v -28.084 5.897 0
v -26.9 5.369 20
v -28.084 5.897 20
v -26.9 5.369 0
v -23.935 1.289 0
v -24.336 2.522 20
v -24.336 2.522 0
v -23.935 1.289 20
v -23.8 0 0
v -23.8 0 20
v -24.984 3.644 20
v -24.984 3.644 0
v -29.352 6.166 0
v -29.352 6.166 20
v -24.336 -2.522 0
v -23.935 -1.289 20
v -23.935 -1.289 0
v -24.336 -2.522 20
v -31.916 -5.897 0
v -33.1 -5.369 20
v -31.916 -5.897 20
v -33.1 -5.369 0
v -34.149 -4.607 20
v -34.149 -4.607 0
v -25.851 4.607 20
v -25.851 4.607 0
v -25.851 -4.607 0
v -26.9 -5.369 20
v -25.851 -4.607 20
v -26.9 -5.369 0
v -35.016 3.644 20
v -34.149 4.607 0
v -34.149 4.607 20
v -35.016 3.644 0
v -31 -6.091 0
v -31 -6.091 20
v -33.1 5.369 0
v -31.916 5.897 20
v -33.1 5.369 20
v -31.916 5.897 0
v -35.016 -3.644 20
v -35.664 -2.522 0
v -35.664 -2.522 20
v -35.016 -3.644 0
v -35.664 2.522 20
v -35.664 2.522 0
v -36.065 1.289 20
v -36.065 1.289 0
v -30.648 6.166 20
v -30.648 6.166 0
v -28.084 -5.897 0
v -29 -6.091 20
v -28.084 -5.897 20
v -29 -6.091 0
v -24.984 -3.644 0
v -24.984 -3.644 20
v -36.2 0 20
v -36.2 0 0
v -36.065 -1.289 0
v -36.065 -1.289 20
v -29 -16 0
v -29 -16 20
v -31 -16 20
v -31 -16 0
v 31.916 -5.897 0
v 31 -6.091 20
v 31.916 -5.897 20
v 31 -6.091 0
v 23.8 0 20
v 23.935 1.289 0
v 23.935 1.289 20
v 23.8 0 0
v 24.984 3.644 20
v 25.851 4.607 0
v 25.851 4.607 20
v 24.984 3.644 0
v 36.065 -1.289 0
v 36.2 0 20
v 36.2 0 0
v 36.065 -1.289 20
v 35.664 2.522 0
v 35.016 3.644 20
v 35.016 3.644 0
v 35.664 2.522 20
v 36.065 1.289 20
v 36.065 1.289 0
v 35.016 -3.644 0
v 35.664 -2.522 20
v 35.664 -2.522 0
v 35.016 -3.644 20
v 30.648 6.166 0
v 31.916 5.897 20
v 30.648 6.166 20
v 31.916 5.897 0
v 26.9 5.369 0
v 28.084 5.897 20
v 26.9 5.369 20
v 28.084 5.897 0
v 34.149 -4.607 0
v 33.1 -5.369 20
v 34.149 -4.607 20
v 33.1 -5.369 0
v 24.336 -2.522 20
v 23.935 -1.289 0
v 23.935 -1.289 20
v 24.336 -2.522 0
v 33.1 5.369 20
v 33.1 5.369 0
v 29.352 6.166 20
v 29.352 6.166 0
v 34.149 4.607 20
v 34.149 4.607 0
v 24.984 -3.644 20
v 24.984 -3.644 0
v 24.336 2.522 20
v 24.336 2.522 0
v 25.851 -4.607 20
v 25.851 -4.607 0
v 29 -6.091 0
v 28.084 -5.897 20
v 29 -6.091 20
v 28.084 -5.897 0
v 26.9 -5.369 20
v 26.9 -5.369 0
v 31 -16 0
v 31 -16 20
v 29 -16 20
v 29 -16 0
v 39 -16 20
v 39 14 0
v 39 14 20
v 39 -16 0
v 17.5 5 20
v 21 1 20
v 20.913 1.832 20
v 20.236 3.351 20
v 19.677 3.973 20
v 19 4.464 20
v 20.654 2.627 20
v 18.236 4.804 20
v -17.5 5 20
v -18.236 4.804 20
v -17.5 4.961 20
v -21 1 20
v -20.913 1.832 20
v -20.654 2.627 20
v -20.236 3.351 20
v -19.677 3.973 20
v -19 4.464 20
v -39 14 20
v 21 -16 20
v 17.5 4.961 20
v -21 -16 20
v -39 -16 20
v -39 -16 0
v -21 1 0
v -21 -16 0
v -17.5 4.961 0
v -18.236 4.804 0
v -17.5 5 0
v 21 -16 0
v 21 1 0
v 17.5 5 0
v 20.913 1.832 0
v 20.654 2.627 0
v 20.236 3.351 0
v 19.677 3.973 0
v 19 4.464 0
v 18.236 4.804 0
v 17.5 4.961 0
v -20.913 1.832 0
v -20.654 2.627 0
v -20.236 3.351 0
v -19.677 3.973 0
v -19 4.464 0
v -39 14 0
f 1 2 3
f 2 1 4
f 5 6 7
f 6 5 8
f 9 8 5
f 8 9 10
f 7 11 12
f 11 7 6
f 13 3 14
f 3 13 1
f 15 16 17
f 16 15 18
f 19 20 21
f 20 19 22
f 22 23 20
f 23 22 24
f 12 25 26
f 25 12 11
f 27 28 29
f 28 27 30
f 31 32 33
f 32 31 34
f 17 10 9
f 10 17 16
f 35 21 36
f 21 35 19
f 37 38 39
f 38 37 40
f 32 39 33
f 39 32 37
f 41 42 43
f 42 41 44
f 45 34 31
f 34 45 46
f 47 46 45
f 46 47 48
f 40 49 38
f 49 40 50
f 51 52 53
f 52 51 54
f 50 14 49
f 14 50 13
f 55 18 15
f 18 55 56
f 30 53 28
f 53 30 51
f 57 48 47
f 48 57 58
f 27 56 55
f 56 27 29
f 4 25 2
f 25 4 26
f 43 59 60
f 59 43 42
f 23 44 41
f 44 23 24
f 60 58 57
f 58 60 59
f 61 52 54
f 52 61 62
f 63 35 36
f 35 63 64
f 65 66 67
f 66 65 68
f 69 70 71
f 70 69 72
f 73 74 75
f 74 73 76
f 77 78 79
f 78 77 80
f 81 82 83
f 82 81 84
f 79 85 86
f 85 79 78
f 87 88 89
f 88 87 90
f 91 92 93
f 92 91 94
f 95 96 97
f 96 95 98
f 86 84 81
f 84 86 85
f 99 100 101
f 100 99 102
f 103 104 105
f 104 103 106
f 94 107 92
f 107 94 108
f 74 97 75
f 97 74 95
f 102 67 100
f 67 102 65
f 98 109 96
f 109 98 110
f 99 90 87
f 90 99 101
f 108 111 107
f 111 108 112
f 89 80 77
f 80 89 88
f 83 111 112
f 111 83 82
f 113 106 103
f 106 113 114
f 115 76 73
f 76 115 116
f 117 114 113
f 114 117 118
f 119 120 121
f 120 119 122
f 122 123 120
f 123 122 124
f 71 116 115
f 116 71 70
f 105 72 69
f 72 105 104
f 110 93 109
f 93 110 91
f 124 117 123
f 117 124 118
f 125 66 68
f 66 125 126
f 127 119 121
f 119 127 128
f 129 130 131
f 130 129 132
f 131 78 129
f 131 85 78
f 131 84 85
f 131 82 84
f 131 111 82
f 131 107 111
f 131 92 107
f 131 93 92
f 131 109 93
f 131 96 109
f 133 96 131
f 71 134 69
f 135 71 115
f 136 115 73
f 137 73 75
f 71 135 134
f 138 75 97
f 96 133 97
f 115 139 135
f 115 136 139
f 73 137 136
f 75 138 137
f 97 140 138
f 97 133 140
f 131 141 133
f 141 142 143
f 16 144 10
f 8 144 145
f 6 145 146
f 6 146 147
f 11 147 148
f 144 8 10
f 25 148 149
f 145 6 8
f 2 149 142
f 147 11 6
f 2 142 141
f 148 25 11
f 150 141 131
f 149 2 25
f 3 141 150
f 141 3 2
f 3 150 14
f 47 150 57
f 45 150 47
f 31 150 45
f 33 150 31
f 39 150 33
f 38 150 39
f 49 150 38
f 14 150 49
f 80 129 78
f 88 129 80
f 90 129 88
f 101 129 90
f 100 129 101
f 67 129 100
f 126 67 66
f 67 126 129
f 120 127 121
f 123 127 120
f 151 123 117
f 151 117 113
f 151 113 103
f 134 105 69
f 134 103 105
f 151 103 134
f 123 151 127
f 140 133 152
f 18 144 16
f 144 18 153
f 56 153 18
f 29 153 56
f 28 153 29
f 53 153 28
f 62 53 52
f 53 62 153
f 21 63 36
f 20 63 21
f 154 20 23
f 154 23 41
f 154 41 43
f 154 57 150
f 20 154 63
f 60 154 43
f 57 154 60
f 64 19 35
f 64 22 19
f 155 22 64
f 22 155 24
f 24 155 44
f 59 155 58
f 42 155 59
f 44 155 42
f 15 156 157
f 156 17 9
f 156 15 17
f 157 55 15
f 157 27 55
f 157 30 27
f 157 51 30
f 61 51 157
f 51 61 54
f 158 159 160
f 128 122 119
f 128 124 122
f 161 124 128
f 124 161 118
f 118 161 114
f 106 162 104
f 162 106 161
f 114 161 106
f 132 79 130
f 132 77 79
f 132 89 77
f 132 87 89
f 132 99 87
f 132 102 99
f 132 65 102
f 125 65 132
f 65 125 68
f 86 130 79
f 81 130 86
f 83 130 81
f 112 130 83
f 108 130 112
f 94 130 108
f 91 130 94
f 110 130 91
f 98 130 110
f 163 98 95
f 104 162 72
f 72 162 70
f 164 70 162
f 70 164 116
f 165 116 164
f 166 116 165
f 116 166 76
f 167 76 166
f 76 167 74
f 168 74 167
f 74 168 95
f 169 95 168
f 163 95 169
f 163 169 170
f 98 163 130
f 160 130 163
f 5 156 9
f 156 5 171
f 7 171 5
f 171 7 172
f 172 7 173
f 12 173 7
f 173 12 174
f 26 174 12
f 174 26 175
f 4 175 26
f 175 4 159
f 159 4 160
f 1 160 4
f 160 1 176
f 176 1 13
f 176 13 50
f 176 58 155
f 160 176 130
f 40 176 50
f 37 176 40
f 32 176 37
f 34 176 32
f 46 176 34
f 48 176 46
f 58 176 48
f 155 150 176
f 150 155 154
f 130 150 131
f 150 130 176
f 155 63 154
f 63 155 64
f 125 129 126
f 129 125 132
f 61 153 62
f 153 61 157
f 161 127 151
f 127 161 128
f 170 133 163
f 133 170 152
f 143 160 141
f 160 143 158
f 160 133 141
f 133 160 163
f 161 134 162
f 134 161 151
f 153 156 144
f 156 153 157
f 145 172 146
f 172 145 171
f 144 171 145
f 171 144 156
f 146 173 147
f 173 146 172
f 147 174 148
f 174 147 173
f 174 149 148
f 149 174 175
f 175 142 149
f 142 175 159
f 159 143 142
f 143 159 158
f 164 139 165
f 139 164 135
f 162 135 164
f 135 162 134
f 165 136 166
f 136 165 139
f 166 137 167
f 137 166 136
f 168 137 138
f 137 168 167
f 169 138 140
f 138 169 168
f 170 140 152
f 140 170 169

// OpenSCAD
// Rostock Bracket from Jcrocholl modified to take 12mm smooth rods by Kolergy
//    - Increase sandwitch mount size & rod mounting slots
//    - Repositioned screws



$fa = 12;
$fs = 0.5;

w = 60; // Smooth rod distance (center to center)

module screws() {
  for (x = [-w/2, w/2]) {
    translate([x, 0, 0]) {
	 // Push-through M3 screw hole.
      translate([0, -10, 0]) rotate([0, 90, 0]) cylinder(r=1.65, h=20, center=true); 
	 // M3 nut holder.
      translate([-x/3.8, -10, 0]) rotate([0, 90, 0]) cylinder(r=3.2, h=2.3, center=true, $fn=6);  //rotate([30, 0, 0]) 
    }
  }
}

module bracket(h) {
  difference() {
    union() {
      translate([   0, -1, 0]) cube([w+18, 30, h], center=true);
      // Sandwich mount.
      //translate([-w/2, 12.5, 0]) cylinder(r=9, h=h, center=true);
      //translate([ w/2, 12.5, 0]) cylinder(r=9, h=h, center=true);
    }
    // Sandwich mount.
    //translate([-w/2, 13, 0]) cylinder(r=1.9, h=h+1, center=true);
    //translate([ w/2, 13, 0]) cylinder(r=1.9, h=h+1, center=true);
    // Smooth rod mounting slots.
    for (x = [-w/2, w/2]) {
      translate([x, 0, 0]) {
		cylinder(r=6.2, h=h+1, center=true);
		translate([0, -10, 0]) cube([2, 20, h+1], center=true);
      }
    }
    // Belt path.
    translate([0, -5, 0]) cube([w-25, 20, h+1], center=true);
    translate([0, -9, 0]) cube([w-18, 20, h+1], center=true);
    translate([-w/2+13, 1, 0]) cylinder(r=4, h=h+1, center=true);
    translate([ w/2-13, 1, 0]) cylinder(r=4, h=h+1, center=true);
  }
}

translate([0, 0, 10]) bracket(20);
